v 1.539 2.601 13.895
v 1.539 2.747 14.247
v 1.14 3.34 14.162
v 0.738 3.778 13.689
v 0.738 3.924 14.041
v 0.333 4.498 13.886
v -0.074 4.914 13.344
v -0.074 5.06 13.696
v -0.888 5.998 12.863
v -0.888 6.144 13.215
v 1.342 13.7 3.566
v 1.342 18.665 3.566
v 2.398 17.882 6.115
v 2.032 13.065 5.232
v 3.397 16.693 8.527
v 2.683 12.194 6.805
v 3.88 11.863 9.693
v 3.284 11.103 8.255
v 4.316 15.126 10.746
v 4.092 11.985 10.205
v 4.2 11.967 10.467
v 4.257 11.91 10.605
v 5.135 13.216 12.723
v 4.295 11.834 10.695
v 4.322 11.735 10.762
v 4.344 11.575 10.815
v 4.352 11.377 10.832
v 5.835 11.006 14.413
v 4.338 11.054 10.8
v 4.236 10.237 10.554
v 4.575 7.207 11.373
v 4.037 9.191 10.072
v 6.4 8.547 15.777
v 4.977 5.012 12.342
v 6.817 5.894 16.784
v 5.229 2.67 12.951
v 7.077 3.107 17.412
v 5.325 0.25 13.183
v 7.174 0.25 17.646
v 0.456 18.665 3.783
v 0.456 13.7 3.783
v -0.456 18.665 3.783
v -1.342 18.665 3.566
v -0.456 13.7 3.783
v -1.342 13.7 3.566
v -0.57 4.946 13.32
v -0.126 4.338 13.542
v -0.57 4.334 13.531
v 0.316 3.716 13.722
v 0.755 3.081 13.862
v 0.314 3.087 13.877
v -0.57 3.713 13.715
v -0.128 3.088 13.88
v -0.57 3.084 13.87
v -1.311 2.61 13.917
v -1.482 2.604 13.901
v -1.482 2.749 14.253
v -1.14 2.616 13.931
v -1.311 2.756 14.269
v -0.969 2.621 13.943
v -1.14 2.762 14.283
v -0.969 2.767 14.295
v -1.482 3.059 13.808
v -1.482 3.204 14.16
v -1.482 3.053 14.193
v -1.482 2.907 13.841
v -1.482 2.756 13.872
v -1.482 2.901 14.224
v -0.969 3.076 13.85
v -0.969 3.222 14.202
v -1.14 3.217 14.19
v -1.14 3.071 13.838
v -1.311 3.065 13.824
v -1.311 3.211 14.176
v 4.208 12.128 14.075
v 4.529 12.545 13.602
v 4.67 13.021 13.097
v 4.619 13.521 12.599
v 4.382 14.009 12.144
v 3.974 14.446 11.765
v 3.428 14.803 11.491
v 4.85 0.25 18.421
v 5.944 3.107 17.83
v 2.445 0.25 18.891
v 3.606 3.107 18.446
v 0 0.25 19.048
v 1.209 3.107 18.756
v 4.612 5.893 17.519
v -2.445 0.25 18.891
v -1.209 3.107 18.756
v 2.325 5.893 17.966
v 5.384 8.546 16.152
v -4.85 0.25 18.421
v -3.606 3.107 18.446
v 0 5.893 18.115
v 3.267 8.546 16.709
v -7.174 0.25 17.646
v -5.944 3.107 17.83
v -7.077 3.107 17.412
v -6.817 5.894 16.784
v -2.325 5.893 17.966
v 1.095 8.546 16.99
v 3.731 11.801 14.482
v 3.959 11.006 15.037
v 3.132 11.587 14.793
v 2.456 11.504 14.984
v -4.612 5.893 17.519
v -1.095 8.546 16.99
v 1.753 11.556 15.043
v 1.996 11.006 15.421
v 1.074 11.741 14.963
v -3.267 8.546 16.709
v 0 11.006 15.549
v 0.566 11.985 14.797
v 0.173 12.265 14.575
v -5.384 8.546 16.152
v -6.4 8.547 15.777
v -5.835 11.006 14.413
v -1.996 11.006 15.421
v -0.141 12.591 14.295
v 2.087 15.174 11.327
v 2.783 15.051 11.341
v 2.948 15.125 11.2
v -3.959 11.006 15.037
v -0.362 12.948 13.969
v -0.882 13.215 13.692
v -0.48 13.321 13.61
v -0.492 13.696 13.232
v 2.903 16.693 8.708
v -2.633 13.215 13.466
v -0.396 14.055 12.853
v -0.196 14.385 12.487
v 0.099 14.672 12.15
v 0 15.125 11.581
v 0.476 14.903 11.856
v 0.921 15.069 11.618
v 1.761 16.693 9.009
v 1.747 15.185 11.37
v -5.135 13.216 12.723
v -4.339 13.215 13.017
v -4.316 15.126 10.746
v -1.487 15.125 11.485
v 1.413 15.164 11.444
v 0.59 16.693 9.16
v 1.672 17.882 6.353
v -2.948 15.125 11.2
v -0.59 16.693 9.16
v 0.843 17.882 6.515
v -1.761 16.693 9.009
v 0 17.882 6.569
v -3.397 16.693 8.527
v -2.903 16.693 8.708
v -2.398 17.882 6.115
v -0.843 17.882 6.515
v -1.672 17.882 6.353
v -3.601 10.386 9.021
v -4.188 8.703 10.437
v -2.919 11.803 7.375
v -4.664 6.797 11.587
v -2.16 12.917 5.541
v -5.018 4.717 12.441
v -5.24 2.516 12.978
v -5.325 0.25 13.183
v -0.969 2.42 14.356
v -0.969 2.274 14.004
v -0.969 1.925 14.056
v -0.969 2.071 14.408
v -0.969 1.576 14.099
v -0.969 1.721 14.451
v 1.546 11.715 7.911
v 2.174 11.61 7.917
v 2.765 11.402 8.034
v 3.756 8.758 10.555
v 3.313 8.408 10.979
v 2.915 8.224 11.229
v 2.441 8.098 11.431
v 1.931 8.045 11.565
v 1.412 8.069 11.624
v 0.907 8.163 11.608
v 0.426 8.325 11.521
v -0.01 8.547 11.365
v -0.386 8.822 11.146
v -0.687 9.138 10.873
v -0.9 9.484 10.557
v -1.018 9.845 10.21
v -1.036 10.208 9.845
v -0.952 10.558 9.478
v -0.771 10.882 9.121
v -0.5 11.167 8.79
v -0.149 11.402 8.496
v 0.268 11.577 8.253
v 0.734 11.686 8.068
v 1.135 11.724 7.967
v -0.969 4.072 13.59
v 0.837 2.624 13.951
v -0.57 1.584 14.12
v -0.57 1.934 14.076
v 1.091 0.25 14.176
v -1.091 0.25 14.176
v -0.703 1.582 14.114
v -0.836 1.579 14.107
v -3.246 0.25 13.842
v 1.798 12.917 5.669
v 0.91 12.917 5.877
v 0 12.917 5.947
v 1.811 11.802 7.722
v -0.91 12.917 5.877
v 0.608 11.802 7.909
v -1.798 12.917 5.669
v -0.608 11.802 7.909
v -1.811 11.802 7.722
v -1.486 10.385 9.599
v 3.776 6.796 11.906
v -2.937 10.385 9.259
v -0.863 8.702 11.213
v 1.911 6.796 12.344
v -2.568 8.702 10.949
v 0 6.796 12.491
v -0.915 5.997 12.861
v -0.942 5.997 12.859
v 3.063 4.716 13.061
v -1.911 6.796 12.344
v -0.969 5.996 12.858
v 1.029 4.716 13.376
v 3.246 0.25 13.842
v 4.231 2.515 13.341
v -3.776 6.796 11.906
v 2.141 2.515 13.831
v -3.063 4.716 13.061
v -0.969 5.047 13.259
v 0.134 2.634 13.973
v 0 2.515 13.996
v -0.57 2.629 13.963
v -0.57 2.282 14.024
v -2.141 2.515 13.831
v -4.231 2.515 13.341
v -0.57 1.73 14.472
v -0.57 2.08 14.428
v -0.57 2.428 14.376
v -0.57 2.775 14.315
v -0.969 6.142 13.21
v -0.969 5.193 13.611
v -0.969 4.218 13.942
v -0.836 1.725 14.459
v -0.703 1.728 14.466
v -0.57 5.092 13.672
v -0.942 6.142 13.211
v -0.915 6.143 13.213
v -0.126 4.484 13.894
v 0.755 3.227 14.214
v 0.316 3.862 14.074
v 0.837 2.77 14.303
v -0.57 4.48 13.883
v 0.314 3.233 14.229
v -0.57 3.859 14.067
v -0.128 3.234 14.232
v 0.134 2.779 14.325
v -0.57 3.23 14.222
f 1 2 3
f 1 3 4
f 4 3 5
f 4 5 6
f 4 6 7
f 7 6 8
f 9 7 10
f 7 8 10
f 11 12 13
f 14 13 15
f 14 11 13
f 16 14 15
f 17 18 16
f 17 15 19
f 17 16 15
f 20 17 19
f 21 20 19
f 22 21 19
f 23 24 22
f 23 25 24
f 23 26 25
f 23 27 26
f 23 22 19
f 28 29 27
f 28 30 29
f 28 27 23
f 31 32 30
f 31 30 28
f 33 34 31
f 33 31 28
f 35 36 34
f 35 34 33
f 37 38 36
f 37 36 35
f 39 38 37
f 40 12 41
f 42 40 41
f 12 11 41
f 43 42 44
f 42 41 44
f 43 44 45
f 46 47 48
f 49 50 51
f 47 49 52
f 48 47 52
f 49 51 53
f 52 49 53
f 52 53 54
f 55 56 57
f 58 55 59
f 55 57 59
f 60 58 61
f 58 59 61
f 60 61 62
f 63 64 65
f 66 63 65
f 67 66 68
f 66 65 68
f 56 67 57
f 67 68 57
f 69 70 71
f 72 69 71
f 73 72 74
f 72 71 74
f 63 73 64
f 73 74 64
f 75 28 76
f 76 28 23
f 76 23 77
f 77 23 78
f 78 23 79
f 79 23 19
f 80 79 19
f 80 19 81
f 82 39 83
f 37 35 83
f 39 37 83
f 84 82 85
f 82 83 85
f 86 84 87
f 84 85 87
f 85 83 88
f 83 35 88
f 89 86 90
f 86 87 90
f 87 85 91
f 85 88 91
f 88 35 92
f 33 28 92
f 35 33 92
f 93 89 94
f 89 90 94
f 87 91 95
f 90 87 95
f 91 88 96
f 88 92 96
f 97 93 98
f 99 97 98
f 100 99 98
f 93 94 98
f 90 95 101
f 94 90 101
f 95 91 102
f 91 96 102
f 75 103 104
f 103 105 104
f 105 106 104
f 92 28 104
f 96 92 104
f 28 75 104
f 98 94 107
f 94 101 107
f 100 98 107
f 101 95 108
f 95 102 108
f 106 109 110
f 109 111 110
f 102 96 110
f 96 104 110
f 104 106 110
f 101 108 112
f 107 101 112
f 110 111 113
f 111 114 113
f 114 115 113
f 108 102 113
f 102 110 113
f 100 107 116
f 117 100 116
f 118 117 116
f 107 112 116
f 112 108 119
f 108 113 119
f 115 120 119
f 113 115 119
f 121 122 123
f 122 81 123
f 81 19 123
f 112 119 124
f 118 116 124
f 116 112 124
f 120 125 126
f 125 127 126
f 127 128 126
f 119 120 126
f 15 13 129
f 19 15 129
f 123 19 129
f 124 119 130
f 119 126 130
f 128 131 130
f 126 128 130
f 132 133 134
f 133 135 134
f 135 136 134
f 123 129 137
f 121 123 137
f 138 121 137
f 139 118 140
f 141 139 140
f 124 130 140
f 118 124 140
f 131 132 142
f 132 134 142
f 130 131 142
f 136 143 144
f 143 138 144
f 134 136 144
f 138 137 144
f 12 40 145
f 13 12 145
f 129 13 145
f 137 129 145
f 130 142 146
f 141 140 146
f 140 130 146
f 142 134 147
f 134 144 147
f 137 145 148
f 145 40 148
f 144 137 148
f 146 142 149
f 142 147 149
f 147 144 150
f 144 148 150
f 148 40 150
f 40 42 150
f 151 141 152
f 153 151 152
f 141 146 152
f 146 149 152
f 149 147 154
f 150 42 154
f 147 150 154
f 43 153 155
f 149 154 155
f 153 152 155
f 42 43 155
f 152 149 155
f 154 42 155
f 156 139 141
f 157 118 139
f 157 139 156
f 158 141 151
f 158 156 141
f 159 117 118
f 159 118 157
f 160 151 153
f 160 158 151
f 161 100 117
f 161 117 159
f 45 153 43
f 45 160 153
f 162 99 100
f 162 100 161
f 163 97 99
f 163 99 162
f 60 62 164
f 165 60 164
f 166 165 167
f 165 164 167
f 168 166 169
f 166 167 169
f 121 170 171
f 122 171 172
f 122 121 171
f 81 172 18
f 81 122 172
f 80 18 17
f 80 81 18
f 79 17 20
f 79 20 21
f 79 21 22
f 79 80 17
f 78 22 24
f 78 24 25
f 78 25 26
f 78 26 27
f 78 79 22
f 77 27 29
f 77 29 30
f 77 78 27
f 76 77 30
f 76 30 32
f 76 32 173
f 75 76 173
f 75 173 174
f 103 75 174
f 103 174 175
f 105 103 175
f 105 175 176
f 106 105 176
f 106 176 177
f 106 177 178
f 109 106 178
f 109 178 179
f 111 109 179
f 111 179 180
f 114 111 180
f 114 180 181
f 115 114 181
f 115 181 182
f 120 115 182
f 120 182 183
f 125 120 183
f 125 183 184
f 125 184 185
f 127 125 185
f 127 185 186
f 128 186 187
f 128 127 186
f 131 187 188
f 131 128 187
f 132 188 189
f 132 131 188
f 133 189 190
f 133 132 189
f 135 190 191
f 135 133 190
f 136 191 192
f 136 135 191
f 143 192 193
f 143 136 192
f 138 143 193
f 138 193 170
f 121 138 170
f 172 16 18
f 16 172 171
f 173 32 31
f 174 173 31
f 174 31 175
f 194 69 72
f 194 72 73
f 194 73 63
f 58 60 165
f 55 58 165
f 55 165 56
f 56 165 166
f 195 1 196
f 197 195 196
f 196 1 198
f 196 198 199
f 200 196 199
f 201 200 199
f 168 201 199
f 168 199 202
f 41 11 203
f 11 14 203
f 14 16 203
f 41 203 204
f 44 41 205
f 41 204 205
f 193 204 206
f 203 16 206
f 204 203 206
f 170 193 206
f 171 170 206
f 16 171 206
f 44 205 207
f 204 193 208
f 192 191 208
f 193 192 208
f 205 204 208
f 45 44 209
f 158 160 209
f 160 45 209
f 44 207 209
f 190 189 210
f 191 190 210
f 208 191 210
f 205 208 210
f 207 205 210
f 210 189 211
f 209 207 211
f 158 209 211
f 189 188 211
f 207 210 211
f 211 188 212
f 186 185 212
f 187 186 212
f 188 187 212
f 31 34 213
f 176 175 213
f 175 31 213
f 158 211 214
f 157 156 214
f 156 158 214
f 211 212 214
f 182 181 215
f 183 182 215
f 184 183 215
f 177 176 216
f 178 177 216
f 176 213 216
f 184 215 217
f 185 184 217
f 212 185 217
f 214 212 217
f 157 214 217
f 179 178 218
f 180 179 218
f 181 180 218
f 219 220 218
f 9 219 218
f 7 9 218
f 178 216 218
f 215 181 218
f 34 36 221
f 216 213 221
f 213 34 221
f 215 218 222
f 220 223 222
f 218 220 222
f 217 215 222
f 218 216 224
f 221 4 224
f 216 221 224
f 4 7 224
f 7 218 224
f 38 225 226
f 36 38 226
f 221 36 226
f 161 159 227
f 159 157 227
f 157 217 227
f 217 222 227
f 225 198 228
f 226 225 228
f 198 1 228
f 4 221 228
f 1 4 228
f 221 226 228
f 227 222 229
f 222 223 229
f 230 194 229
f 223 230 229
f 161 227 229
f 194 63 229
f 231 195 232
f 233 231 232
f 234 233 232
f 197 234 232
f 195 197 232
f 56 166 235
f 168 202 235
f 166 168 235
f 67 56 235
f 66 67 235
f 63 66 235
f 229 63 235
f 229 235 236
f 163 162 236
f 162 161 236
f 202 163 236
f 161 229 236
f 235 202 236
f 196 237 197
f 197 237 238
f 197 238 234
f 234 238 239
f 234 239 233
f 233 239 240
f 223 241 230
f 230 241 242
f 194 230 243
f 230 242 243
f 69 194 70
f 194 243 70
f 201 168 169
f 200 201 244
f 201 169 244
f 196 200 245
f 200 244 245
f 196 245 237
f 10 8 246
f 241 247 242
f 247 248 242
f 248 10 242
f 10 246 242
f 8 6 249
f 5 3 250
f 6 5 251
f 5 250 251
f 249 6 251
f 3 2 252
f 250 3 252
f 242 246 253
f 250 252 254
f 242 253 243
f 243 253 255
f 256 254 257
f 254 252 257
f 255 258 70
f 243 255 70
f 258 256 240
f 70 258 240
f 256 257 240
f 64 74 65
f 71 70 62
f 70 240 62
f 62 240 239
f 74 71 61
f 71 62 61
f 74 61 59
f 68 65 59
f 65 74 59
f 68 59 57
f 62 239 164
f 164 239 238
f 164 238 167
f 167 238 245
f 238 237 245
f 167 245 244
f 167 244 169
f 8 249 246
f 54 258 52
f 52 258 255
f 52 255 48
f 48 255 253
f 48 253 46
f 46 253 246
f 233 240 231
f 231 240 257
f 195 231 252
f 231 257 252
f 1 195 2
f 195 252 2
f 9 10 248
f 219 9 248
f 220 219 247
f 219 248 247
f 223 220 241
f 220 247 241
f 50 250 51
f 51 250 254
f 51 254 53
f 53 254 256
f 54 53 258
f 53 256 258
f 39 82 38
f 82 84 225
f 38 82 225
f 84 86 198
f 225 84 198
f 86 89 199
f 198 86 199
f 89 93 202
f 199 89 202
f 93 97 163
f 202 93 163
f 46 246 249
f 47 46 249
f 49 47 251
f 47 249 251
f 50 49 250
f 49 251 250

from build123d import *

# Parameters (mm, degrees)
REVOLVE1_ANGLE            = 45
CUT_EXTRUDE1_DEPTH        = 28.647117169
CUT_EXTRUDE1_DEPTH_BACK   = 28.647117169
CUT_EXTRUDE4_REACH        = 29.998
CUT_EXTRUDE4_START_RADIUS = 14.22
CUT_EXTRUDE4_END_RADIUS   = 14.22
CUT_EXTRUDE5_DEPTH        = 26.992100662
CUT_EXTRUDE5_DEPTH_BACK   = 26.992100662
SKETCH9_R                 = 2.6035


with BuildPart() as part:
    # Sketch1 → Revolve1 (revolve, symmetric)
    with BuildSketch(Plane(origin=(0, 0, 0), x_dir=(0, 0, -1), z_dir=(1, 0, 0))) as revolve1_sk:
        with BuildLine():
            Line((-14.217802221, 0.25), (-19.048359509, 0.25))
            ThreePointArc((-19.048359509, 0.25), (-14.676690222, 12.144845166), (-3.81, 18.66511184))
            Line((-3.81, 18.66511184), (-3.81, 13.700083941))
            ThreePointArc((-3.81, 13.700083941), (-11.246181696, 8.70240181), (-14.217802221, 0.25))
        make_face()
    revolve(axis=Axis((0, 0, 0), (0, 1, 0)), revolution_arc=REVOLVE1_ANGLE / 2)
    revolve(revolve1_sk.sketch, axis=Axis((0, 0, 0), (0, -1, 0)), revolution_arc=REVOLVE1_ANGLE / 2)

    # Sketch2 → Cut-Extrude1 (cut, two sides: drawn at the far end of the back side and taken through both)
    with BuildSketch(Plane(origin=(0, 0, 0), x_dir=(1, 0, 0), z_dir=(0, 1, 0)).offset(-CUT_EXTRUDE1_DEPTH_BACK)):
        with BuildLine():
            Line((7.289491598, -17.598389479), (1.458023877, -3.519981019))
            ThreePointArc((1.458023877, -3.519981019), (1.400077392, -3.543428184), (1.341754023, -3.5659215))
            Line((1.341754023, -3.5659215), (7.173849701, -17.645845983))
            ThreePointArc((7.173849701, -17.645845983), (7.231709577, -17.622212591), (7.289491598, -17.598389479))
        make_face()
        with BuildLine():
            Line((-7.173849701, -17.645845983), (-1.341754023, -3.5659215))
            ThreePointArc((-1.341754023, -3.5659215), (-1.400077392, -3.543428184), (-1.458023877, -3.519981019))
            Line((-1.458023877, -3.519981019), (-7.289491598, -17.598389479))
            ThreePointArc((-7.289491598, -17.598389479), (-7.231709577, -17.622212591), (-7.173849701, -17.645845983))
        make_face()
    extrude(amount=CUT_EXTRUDE1_DEPTH + CUT_EXTRUDE1_DEPTH_BACK, mode=Mode.SUBTRACT)

    # Cut-Extrude4: from a sphere face, 29.998 long prism both ways, kept between that surface and its translate by the depth
    cut_extrude4_start = Location((0, 0, 0)) * Sphere(CUT_EXTRUDE4_START_RADIUS, mode=Mode.PRIVATE)
    cut_extrude4_end = Location((0, 0.145802388, 0.351998102)) * Sphere(CUT_EXTRUDE4_END_RADIUS, mode=Mode.PRIVATE)
    # Sketch8 → Cut-Extrude4 (cut, from a surface)
    with BuildSketch(Plane(origin=(0, 0, 0), x_dir=(-1, 0, 0), z_dir=(0, 0.3826834323650899, 0.9238795325112868)), mode=Mode.PRIVATE) as cut_extrude4_sk1:
        Polygon((0.887753405, -0.619026887), (0.968782051, -0.619026887), (0.968782051, 2.458280805), (1.481666667, 2.458280805), (1.481666667, 2.914178241), (0.968782051, 2.914178241), (0.968782051, 3.939947472), (0.569871795, 3.939947472), (0.569871795, 2.914178241), (-1.538653846, 2.914178241), align=None)
        Polygon((0.569871795, 2.458280805), (0.569871795, 0.5278401), (-0.755080128, 2.458280805), align=None, mode=Mode.SUBTRACT)
    cut_extrude4_tool1 = extrude(cut_extrude4_sk1.sketch, amount=CUT_EXTRUDE4_REACH, both=True, mode=Mode.PRIVATE)
    add(((cut_extrude4_tool1 - cut_extrude4_start) & cut_extrude4_end).solids().sort_by_distance((-0.928268, 5.918875, 12.814738))[0], mode=Mode.SUBTRACT)

    # Sketch9 → Cut-Extrude5 (cut, two sides: drawn at the far end of the back side and taken through both)
    with BuildSketch(Plane(origin=(2.950125281, 18.858537854, 18.626357959), x_dir=(-0.8917235779063104, -0.23968096505674769, 0.3839037582460406), z_dir=(-0.1106158710412275, -0.7071067811865475, -0.6984011233337121)).offset(-CUT_EXTRUDE5_DEPTH_BACK)):
        with Locations(Location((0, 0, 0), (0, 0, 116.203724747))):
            Circle(SKETCH9_R)
    extrude(amount=CUT_EXTRUDE5_DEPTH + CUT_EXTRUDE5_DEPTH_BACK, mode=Mode.SUBTRACT)


solid = part.part
